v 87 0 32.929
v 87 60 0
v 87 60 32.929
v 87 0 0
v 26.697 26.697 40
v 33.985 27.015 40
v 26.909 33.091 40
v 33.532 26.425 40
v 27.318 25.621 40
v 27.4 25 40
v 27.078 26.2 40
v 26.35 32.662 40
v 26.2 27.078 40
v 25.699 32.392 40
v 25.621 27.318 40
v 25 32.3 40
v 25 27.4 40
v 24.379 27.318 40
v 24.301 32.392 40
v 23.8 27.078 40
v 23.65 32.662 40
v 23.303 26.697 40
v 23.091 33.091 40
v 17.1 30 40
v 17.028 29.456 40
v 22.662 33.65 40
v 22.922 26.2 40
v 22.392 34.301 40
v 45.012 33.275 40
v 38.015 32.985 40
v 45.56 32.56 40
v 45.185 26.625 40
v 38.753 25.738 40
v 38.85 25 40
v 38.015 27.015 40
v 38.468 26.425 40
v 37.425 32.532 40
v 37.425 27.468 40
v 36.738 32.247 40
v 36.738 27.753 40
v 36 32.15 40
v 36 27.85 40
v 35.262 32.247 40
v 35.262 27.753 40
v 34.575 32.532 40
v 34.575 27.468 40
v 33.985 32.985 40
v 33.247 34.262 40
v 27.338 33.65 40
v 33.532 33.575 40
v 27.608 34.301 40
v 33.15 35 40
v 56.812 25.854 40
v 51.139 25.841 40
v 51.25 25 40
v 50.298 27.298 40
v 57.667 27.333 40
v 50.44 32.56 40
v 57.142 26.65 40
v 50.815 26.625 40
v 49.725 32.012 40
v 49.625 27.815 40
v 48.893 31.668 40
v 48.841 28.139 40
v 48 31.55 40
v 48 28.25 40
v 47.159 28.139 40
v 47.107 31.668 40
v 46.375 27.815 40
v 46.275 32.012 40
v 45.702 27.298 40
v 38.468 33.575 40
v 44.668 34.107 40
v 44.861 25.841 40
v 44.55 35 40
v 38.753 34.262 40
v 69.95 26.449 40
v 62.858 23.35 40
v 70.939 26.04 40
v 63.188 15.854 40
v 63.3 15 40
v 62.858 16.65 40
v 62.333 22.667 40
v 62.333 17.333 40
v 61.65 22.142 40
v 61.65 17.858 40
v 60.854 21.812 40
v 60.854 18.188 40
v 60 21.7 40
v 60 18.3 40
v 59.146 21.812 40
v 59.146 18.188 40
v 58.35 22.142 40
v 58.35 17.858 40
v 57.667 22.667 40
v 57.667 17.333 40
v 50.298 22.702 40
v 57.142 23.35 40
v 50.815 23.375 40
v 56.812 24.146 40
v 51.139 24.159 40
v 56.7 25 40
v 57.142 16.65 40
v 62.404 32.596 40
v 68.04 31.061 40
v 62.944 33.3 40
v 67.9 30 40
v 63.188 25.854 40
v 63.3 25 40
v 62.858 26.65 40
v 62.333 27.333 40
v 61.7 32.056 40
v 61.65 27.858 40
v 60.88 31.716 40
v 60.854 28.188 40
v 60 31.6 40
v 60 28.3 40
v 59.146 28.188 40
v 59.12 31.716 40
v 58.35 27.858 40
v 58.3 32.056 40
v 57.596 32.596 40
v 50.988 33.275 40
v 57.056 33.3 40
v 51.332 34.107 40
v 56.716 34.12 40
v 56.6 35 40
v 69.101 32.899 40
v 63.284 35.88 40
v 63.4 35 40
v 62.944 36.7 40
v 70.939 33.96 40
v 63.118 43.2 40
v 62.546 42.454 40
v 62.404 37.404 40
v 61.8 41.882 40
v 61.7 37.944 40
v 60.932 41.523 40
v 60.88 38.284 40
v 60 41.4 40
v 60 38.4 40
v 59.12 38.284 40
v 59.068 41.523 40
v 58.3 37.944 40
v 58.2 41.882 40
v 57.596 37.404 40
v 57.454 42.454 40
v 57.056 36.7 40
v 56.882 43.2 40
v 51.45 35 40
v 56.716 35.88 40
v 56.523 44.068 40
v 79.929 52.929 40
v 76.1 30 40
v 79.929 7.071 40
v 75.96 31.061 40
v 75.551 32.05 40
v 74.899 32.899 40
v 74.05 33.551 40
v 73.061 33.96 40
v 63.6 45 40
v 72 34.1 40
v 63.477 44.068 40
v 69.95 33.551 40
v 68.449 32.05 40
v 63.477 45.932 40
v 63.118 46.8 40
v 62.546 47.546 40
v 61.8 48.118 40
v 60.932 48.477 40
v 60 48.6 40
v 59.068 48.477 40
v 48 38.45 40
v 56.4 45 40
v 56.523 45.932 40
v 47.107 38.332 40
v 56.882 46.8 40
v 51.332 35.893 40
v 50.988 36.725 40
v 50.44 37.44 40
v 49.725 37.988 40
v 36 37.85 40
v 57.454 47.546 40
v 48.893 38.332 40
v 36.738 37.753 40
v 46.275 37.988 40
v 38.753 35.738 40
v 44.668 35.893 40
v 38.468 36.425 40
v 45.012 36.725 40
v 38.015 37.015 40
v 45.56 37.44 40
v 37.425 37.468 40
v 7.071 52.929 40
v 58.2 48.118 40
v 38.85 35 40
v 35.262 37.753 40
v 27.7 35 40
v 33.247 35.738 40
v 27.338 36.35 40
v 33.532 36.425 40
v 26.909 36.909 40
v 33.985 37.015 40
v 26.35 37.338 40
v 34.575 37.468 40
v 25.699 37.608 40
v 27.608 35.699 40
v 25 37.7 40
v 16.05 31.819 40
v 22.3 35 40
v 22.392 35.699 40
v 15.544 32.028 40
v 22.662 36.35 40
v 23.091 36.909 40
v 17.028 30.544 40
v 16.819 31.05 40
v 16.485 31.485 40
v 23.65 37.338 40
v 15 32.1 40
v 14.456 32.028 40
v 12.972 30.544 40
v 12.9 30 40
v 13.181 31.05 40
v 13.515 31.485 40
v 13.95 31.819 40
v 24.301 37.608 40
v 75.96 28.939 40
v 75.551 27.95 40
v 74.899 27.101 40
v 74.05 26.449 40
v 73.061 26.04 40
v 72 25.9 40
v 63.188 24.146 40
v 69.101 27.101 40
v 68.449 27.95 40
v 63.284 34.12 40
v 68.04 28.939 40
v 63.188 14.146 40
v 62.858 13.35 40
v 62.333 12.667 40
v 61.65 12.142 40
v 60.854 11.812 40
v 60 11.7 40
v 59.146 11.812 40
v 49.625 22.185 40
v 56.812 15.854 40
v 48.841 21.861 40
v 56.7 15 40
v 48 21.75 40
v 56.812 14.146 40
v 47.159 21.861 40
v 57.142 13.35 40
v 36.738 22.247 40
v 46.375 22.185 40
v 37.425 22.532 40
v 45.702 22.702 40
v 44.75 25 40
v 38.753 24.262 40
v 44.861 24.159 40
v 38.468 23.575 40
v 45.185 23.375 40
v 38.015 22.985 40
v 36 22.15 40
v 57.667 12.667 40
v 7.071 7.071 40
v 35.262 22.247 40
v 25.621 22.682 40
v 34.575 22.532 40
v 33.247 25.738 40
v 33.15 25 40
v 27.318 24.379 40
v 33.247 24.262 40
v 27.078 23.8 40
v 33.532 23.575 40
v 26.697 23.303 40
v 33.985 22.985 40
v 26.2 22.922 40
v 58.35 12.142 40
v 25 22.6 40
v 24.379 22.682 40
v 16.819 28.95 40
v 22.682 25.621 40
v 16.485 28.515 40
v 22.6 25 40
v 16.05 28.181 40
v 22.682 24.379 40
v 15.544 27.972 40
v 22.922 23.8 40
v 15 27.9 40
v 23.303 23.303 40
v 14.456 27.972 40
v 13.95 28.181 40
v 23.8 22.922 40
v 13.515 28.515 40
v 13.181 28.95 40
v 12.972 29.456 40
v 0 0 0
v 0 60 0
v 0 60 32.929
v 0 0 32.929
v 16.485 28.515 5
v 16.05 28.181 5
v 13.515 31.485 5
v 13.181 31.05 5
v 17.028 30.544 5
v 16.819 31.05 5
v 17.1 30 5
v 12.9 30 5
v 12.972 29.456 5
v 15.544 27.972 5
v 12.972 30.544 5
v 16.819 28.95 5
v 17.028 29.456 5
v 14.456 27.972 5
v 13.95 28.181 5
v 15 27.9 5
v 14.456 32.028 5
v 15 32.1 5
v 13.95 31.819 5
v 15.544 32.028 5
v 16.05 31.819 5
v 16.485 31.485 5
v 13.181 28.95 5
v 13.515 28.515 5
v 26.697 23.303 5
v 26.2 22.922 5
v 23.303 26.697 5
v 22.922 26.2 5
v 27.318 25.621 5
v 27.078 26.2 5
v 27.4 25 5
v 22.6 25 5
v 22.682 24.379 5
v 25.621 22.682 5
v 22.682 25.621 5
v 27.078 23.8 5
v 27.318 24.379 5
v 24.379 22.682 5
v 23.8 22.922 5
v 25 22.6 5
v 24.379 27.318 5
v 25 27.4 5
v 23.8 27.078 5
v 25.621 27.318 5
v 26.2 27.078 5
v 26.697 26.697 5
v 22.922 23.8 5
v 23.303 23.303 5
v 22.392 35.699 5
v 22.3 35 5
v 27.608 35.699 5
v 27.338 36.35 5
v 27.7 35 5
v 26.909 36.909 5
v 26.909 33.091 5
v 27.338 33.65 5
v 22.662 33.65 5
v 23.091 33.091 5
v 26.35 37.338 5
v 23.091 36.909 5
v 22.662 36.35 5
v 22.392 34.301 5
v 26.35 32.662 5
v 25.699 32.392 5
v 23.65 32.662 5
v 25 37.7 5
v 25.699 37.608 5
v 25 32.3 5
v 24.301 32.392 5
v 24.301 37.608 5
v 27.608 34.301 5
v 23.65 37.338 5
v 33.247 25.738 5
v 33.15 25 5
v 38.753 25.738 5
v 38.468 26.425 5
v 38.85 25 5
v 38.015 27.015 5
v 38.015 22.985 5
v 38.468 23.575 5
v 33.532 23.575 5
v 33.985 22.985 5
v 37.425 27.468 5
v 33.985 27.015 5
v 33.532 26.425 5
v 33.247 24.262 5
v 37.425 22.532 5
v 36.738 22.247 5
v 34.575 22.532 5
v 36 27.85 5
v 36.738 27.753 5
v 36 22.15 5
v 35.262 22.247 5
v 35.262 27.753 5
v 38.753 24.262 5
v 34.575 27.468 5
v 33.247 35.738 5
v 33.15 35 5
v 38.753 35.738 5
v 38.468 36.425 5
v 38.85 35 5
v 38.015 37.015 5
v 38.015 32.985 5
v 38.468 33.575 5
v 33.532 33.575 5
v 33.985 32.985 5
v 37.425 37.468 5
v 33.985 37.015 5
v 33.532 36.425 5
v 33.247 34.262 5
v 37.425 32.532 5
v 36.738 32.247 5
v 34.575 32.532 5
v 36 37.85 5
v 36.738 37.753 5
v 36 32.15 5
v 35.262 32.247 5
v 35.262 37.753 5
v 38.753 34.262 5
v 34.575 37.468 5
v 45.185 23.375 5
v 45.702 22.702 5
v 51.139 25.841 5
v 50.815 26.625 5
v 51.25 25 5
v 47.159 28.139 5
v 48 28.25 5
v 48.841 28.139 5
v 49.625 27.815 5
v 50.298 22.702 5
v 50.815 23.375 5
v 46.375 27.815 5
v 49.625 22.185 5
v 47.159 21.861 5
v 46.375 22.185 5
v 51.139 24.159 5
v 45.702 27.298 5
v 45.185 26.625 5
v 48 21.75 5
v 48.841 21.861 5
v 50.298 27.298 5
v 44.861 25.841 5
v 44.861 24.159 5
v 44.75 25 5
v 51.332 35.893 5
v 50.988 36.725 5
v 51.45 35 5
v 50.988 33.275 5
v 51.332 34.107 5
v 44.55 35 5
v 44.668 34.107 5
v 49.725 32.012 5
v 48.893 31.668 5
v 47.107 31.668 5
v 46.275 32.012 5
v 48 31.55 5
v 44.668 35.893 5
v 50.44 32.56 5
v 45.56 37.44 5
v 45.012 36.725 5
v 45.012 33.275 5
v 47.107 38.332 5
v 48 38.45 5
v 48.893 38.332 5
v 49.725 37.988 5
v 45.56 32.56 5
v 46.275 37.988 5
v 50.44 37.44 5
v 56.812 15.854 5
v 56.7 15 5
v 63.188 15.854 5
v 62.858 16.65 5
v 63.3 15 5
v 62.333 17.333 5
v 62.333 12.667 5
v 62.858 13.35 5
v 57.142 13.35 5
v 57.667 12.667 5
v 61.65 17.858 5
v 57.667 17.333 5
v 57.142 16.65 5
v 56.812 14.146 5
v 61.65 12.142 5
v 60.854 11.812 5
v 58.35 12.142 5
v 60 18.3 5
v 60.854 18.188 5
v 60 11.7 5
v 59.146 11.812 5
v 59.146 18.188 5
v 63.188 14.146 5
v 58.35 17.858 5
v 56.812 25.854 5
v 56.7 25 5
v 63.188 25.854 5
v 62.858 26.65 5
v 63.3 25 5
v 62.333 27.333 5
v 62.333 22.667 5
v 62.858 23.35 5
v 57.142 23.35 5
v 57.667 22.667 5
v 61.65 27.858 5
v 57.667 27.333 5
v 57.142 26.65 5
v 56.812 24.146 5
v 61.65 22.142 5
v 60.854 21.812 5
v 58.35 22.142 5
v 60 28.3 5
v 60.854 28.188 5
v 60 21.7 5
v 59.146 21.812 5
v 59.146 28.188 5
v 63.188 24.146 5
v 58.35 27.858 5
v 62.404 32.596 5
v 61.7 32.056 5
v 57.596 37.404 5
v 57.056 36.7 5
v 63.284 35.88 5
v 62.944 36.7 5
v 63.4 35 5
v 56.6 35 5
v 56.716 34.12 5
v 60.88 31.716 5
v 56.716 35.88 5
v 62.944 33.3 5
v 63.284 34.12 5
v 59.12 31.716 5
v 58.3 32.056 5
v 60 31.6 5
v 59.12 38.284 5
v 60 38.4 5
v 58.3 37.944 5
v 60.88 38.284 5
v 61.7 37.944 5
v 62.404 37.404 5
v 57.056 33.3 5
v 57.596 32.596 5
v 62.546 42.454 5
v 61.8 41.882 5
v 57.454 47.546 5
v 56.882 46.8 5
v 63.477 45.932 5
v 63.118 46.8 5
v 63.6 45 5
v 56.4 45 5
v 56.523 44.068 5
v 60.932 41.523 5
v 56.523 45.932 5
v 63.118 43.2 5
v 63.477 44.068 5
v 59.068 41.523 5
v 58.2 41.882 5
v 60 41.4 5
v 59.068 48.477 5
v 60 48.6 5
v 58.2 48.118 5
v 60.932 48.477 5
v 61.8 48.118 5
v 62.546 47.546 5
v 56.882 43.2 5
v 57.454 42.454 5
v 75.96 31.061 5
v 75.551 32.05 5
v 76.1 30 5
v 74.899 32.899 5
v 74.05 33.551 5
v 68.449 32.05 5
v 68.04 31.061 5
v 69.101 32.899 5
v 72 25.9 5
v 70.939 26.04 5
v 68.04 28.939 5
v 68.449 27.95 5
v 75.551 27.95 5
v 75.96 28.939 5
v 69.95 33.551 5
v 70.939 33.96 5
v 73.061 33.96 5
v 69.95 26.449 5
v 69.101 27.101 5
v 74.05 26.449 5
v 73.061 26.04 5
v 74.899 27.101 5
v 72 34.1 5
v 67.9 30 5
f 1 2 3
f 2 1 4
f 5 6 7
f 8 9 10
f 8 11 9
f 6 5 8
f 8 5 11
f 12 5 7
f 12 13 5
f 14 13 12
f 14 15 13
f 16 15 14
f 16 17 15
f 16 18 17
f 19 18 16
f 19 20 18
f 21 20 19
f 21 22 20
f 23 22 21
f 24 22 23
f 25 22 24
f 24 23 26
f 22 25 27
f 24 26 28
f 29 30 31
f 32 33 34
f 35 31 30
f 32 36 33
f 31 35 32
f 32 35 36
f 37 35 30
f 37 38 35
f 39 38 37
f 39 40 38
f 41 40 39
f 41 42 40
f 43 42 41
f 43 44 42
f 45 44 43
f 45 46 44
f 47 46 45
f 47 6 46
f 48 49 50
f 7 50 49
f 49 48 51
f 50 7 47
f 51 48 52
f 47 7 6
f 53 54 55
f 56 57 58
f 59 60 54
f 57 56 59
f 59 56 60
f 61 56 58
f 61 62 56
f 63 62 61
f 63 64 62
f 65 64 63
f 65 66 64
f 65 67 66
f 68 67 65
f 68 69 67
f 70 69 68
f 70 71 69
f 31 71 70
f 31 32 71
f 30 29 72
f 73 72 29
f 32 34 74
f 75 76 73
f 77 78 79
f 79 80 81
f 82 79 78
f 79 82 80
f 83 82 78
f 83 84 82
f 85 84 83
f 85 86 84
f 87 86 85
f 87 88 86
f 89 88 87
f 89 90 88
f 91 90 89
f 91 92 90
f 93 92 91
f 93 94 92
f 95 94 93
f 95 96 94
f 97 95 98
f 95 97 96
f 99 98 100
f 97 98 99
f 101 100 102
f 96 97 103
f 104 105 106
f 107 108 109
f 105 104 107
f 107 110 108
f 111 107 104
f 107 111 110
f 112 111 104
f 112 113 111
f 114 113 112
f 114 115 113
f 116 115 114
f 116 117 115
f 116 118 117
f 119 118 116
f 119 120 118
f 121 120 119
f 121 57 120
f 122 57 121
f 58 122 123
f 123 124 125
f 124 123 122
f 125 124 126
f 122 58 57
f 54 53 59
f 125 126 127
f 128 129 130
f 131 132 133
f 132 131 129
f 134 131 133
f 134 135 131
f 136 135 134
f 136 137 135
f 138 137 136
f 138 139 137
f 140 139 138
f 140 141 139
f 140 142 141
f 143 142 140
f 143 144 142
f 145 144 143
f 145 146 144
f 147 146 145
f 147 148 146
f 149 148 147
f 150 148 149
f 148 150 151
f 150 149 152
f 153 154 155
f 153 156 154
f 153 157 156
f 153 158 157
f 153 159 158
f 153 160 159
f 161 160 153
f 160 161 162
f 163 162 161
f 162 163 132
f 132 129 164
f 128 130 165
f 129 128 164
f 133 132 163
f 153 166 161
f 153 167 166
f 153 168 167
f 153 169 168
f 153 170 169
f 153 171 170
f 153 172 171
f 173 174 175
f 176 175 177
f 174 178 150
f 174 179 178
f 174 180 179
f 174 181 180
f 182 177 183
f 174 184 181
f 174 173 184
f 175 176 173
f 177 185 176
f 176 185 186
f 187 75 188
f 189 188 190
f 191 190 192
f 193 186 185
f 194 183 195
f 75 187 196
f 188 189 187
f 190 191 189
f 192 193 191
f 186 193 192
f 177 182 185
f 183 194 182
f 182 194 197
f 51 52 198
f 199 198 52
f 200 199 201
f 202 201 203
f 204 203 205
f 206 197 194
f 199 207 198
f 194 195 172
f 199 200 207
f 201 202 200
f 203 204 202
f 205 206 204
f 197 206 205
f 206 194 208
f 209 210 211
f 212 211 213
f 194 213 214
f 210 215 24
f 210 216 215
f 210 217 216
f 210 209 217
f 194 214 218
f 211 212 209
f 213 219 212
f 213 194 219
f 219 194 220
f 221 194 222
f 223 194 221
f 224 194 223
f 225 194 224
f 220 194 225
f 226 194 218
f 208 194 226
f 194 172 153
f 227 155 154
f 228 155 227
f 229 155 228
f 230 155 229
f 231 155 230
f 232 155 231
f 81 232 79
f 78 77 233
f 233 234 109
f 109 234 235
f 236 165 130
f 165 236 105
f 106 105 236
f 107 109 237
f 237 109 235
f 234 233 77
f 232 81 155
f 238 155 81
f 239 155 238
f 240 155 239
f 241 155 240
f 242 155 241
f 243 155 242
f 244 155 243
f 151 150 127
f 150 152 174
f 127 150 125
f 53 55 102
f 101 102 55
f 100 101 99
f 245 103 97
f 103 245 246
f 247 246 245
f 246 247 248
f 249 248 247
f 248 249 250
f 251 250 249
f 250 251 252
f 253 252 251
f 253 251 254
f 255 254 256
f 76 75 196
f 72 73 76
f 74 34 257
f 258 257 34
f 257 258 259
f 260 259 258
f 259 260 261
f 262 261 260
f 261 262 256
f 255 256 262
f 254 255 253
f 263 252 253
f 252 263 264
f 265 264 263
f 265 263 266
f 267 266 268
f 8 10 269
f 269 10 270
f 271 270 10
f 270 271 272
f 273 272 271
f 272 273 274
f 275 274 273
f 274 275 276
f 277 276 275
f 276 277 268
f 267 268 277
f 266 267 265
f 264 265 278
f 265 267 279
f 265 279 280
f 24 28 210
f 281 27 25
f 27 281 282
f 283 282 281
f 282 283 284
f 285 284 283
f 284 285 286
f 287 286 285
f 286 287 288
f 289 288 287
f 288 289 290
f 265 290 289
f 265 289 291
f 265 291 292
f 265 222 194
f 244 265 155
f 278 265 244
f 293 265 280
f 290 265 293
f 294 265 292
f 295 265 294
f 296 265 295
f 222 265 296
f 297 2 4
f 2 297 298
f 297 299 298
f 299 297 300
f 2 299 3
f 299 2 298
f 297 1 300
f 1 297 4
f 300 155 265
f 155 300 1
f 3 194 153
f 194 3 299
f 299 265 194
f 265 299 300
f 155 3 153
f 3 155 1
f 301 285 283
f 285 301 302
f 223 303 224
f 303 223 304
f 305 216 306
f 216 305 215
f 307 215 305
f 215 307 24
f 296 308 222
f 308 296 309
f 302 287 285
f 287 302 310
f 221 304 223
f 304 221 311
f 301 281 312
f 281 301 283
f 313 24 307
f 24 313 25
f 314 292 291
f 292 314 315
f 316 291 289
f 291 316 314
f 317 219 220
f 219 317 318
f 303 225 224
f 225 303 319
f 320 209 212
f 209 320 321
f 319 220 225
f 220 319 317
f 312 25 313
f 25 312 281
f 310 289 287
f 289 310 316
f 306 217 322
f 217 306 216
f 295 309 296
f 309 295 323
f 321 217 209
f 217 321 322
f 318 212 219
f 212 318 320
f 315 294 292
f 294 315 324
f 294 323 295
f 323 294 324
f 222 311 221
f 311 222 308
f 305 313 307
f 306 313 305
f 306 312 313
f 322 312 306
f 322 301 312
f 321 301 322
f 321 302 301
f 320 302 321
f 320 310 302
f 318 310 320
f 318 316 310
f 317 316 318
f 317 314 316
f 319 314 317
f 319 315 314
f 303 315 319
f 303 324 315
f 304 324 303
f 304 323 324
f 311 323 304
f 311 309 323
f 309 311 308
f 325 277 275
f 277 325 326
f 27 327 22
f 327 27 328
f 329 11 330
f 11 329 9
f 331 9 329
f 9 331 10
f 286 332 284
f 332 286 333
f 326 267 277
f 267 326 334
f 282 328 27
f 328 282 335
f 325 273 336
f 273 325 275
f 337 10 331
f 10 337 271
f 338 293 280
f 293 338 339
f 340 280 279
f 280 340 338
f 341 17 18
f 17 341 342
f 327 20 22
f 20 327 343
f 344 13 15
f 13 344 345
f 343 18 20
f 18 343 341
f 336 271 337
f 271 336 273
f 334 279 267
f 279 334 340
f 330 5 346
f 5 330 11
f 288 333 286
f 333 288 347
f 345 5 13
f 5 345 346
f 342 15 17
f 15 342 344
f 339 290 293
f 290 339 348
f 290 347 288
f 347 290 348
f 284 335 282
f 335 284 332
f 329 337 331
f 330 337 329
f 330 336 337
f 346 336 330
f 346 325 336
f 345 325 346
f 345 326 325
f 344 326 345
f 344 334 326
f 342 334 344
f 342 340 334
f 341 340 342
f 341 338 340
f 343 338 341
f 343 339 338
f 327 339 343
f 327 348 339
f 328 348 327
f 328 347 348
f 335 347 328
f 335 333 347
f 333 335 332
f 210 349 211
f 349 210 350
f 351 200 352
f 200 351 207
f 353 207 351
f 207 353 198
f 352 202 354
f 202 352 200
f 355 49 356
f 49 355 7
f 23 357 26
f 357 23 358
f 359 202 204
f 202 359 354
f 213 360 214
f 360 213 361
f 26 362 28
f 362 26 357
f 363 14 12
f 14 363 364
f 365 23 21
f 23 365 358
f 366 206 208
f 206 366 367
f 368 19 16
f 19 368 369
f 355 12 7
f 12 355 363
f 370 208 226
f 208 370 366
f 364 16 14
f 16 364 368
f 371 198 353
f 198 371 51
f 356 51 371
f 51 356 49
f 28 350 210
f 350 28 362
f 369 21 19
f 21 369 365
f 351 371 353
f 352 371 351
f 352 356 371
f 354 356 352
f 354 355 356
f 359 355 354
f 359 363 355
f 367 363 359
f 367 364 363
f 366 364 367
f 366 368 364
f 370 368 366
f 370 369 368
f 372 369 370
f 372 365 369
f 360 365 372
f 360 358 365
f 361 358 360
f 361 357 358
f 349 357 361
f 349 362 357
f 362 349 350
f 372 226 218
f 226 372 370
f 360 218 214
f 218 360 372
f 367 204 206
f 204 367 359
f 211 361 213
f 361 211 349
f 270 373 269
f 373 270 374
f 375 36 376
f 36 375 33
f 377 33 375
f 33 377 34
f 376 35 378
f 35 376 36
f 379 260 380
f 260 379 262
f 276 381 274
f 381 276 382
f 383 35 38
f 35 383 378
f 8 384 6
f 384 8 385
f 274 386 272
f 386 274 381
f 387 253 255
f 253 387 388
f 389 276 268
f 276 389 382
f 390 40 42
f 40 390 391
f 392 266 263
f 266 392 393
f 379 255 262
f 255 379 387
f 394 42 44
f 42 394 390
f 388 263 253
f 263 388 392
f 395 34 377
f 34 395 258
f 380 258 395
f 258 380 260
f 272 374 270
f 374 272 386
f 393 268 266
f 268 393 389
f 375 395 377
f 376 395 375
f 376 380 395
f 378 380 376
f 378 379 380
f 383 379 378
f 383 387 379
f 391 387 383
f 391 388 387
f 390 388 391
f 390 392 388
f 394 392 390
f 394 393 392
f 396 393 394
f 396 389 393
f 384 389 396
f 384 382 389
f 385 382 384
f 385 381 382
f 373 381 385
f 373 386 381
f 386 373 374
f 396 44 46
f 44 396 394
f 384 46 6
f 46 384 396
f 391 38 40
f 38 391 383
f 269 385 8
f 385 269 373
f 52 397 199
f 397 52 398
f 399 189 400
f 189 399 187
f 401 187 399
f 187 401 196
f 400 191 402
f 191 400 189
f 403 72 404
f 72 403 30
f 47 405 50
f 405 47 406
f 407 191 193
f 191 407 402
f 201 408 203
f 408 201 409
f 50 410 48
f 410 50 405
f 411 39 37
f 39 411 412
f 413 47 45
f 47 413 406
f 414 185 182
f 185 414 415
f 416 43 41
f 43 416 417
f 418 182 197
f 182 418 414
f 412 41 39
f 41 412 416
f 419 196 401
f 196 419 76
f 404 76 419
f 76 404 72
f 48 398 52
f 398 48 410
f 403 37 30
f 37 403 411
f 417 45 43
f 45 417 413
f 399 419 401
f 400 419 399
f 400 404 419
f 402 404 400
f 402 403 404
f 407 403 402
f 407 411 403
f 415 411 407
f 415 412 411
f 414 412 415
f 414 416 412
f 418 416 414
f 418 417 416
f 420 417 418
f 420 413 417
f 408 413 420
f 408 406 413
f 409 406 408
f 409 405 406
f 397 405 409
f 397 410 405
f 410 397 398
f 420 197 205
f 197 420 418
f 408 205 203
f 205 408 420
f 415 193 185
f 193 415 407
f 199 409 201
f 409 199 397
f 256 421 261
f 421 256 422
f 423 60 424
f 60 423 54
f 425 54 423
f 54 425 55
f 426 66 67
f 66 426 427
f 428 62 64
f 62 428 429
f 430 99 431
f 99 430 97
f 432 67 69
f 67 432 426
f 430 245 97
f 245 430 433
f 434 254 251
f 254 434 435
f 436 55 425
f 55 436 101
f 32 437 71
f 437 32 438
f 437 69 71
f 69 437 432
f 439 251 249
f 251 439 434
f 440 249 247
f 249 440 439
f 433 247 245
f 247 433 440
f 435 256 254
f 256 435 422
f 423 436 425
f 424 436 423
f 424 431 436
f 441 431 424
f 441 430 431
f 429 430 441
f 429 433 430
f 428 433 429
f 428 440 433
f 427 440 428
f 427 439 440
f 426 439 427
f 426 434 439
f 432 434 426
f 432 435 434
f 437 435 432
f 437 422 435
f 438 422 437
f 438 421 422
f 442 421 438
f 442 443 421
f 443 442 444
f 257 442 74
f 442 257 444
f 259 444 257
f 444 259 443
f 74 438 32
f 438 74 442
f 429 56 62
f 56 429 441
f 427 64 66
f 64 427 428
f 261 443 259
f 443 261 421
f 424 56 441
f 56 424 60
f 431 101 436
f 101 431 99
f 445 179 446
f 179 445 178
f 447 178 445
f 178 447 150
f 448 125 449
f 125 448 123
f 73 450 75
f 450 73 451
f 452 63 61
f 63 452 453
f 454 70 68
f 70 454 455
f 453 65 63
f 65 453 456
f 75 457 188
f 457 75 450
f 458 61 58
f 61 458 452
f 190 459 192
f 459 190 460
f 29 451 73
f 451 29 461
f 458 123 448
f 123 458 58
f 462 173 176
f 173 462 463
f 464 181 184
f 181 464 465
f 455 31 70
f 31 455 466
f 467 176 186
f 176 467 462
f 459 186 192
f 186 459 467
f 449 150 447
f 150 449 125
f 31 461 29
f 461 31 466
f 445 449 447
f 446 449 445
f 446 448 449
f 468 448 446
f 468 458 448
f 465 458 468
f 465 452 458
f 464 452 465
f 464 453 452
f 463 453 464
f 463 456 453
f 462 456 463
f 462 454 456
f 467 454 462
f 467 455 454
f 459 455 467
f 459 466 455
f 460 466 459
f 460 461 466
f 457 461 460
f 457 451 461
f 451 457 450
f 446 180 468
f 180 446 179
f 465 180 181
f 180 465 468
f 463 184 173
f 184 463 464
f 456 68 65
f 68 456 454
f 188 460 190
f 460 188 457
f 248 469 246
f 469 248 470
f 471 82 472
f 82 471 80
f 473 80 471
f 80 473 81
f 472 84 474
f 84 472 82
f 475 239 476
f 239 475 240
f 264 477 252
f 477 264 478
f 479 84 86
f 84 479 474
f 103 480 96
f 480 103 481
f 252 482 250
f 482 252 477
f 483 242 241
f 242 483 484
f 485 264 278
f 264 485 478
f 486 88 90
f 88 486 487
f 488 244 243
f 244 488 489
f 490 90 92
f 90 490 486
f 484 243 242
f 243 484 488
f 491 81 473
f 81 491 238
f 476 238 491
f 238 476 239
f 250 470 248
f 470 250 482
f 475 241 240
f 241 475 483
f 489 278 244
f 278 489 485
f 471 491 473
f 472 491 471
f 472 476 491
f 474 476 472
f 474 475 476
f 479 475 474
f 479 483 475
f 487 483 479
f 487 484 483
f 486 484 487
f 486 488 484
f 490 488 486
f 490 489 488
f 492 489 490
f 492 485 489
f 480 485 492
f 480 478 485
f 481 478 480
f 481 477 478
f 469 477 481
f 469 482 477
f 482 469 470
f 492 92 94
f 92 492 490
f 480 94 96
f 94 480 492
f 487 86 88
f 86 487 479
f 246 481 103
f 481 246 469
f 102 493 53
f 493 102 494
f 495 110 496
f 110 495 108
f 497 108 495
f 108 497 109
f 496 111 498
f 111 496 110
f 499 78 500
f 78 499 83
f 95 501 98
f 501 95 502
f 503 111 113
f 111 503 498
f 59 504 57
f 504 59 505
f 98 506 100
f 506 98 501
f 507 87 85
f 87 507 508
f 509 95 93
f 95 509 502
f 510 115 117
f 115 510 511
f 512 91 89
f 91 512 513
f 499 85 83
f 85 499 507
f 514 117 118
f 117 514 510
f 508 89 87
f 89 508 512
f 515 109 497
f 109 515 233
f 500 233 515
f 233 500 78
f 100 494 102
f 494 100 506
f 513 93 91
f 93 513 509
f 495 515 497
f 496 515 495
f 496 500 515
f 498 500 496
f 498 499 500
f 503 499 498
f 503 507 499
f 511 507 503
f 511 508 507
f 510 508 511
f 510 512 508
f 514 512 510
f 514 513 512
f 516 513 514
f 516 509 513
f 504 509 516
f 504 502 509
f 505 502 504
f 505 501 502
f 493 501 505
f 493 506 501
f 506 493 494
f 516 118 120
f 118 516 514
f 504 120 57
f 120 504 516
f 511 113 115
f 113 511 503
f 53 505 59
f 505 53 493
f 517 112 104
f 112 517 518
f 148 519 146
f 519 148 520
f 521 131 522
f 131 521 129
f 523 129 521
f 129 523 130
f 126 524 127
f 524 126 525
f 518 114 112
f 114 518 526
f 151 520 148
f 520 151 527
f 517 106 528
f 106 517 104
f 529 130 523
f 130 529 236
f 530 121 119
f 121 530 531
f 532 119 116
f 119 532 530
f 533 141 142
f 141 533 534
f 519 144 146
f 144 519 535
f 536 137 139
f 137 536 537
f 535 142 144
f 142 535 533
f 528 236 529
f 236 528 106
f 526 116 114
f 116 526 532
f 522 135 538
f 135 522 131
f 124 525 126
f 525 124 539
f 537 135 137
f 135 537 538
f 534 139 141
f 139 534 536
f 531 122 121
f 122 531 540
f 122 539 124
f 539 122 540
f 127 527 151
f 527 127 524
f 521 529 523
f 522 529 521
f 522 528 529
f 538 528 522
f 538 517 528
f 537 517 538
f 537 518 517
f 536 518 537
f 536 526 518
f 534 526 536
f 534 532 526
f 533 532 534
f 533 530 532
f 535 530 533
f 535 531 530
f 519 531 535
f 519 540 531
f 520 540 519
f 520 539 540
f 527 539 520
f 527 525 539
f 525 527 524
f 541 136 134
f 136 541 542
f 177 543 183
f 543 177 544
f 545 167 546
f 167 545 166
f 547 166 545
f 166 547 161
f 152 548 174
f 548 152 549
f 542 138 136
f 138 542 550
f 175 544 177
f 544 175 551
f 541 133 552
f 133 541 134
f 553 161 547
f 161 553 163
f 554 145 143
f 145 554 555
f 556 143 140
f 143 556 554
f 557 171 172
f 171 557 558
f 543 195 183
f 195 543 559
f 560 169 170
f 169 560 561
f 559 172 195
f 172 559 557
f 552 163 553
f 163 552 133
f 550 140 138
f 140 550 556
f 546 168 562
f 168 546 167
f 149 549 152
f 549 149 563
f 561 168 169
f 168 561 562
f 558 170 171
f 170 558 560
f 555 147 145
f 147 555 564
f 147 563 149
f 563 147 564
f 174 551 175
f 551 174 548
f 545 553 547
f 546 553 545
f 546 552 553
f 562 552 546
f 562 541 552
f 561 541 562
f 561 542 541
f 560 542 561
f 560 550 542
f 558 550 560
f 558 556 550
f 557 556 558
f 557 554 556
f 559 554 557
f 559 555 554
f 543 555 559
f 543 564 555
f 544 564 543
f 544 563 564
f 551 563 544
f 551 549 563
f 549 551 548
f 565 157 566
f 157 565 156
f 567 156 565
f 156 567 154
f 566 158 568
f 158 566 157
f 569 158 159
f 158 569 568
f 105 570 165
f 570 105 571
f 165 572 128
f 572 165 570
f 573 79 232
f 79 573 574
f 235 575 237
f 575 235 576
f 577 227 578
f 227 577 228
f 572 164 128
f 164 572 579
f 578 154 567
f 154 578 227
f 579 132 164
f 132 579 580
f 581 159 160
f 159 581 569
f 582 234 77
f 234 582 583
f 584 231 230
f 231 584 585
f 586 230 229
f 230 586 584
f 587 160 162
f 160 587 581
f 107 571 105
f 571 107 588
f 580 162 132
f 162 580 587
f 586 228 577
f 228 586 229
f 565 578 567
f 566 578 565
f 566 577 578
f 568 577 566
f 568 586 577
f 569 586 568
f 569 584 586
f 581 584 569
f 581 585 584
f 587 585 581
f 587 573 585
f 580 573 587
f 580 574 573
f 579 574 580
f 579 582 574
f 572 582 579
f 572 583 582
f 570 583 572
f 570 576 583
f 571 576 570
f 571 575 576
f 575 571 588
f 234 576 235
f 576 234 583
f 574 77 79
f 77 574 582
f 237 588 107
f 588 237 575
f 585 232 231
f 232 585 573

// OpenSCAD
// Masonry bits holder 3D Design

// Copyright (c) 2014 by Jeremy Bennett <jeremy.bennett@embecosm.com>

// This 3D Design is licensed under a Creative Commons Attribution-ShareAlike
// 3.0 Unported License.

// You should have received a copy of the license along with this work.  If not,
// see <http://creativecommons.org/licenses/by-sa/3.0/>.

// -----------------------------------------------------------------------------


use <MCAD/regular_shapes.scad>


// Assume offset from base
module drill_hole (x, y, bore) {
	depth = 36;
	translate (v = [x, y, depth / 2 + 5])
		cylinder (r = bore / 2 + 0.5, h = depth, $fn = 24, center = true);
}


module drill_holes () {
	// 4mm bit
	drill_hole (x = 15, y = 30, bore = 3.2);
	// 5mm bits
	drill_hole (x = 25, y = 25, bore = 3.8);
	drill_hole (x = 25, y = 35, bore = 4.4);
	// 6mm bits
	drill_hole (x = 36, y = 25, bore = 4.7);
	drill_hole (x = 36, y = 35, bore = 4.7);
	// 6.5mm and 7mm bits
	drill_hole (x = 48, y = 25, bore = 5.5);
	drill_hole (x = 48, y = 35, bore = 5.9);
	// 8mm bits
	drill_hole (x = 60, y = 15, bore = 5.6);
	drill_hole (x = 60, y = 25, bore = 5.6);
	drill_hole (x = 60, y = 35, bore = 5.8);
	drill_hole (x = 60, y = 45, bore = 6.2);
	// 10mm bit
	drill_hole (x = 72, y = 30, bore = 7.2);
}


// Block to be a support, with bevelled top
module drill_block () {
	width   = 87;
	breadth = 60;
	height  = 40;
	bevel = 10;
	difference () {
		translate (v = [width / 2, breadth / 2, height / 2])
			cube (size = [width, breadth, height], center = true);
		translate (v = [width / 2, 0, height])
			rotate (a = [45, 0, 0])
				rotate (a = [0, 90, 0])
					cube (size = [bevel, bevel, width], center = true);
		translate (v = [width / 2, breadth, height])
			rotate (a = [45, 0, 0])
				rotate (a = [0, 90, 0])
					cube (size = [bevel, bevel, width], center = true);
		translate (v = [0, breadth / 2, height])
			rotate (a = [0, 45, 0])
				rotate (a = [90, 0, 0])
					cube (size = [bevel, bevel, breadth], center = true);
		translate (v = [width, breadth / 2, height])
			rotate (a = [0, 45, 0])
				rotate (a = [90, 0, 0])
					cube (size = [bevel, bevel, breadth], center = true);
	}
}


// Support with screwholes
module drill_support () {
	difference () {
		drill_block ();
		drill_holes ();
	}
}

drill_support ();
width = 87;
height = 40;
